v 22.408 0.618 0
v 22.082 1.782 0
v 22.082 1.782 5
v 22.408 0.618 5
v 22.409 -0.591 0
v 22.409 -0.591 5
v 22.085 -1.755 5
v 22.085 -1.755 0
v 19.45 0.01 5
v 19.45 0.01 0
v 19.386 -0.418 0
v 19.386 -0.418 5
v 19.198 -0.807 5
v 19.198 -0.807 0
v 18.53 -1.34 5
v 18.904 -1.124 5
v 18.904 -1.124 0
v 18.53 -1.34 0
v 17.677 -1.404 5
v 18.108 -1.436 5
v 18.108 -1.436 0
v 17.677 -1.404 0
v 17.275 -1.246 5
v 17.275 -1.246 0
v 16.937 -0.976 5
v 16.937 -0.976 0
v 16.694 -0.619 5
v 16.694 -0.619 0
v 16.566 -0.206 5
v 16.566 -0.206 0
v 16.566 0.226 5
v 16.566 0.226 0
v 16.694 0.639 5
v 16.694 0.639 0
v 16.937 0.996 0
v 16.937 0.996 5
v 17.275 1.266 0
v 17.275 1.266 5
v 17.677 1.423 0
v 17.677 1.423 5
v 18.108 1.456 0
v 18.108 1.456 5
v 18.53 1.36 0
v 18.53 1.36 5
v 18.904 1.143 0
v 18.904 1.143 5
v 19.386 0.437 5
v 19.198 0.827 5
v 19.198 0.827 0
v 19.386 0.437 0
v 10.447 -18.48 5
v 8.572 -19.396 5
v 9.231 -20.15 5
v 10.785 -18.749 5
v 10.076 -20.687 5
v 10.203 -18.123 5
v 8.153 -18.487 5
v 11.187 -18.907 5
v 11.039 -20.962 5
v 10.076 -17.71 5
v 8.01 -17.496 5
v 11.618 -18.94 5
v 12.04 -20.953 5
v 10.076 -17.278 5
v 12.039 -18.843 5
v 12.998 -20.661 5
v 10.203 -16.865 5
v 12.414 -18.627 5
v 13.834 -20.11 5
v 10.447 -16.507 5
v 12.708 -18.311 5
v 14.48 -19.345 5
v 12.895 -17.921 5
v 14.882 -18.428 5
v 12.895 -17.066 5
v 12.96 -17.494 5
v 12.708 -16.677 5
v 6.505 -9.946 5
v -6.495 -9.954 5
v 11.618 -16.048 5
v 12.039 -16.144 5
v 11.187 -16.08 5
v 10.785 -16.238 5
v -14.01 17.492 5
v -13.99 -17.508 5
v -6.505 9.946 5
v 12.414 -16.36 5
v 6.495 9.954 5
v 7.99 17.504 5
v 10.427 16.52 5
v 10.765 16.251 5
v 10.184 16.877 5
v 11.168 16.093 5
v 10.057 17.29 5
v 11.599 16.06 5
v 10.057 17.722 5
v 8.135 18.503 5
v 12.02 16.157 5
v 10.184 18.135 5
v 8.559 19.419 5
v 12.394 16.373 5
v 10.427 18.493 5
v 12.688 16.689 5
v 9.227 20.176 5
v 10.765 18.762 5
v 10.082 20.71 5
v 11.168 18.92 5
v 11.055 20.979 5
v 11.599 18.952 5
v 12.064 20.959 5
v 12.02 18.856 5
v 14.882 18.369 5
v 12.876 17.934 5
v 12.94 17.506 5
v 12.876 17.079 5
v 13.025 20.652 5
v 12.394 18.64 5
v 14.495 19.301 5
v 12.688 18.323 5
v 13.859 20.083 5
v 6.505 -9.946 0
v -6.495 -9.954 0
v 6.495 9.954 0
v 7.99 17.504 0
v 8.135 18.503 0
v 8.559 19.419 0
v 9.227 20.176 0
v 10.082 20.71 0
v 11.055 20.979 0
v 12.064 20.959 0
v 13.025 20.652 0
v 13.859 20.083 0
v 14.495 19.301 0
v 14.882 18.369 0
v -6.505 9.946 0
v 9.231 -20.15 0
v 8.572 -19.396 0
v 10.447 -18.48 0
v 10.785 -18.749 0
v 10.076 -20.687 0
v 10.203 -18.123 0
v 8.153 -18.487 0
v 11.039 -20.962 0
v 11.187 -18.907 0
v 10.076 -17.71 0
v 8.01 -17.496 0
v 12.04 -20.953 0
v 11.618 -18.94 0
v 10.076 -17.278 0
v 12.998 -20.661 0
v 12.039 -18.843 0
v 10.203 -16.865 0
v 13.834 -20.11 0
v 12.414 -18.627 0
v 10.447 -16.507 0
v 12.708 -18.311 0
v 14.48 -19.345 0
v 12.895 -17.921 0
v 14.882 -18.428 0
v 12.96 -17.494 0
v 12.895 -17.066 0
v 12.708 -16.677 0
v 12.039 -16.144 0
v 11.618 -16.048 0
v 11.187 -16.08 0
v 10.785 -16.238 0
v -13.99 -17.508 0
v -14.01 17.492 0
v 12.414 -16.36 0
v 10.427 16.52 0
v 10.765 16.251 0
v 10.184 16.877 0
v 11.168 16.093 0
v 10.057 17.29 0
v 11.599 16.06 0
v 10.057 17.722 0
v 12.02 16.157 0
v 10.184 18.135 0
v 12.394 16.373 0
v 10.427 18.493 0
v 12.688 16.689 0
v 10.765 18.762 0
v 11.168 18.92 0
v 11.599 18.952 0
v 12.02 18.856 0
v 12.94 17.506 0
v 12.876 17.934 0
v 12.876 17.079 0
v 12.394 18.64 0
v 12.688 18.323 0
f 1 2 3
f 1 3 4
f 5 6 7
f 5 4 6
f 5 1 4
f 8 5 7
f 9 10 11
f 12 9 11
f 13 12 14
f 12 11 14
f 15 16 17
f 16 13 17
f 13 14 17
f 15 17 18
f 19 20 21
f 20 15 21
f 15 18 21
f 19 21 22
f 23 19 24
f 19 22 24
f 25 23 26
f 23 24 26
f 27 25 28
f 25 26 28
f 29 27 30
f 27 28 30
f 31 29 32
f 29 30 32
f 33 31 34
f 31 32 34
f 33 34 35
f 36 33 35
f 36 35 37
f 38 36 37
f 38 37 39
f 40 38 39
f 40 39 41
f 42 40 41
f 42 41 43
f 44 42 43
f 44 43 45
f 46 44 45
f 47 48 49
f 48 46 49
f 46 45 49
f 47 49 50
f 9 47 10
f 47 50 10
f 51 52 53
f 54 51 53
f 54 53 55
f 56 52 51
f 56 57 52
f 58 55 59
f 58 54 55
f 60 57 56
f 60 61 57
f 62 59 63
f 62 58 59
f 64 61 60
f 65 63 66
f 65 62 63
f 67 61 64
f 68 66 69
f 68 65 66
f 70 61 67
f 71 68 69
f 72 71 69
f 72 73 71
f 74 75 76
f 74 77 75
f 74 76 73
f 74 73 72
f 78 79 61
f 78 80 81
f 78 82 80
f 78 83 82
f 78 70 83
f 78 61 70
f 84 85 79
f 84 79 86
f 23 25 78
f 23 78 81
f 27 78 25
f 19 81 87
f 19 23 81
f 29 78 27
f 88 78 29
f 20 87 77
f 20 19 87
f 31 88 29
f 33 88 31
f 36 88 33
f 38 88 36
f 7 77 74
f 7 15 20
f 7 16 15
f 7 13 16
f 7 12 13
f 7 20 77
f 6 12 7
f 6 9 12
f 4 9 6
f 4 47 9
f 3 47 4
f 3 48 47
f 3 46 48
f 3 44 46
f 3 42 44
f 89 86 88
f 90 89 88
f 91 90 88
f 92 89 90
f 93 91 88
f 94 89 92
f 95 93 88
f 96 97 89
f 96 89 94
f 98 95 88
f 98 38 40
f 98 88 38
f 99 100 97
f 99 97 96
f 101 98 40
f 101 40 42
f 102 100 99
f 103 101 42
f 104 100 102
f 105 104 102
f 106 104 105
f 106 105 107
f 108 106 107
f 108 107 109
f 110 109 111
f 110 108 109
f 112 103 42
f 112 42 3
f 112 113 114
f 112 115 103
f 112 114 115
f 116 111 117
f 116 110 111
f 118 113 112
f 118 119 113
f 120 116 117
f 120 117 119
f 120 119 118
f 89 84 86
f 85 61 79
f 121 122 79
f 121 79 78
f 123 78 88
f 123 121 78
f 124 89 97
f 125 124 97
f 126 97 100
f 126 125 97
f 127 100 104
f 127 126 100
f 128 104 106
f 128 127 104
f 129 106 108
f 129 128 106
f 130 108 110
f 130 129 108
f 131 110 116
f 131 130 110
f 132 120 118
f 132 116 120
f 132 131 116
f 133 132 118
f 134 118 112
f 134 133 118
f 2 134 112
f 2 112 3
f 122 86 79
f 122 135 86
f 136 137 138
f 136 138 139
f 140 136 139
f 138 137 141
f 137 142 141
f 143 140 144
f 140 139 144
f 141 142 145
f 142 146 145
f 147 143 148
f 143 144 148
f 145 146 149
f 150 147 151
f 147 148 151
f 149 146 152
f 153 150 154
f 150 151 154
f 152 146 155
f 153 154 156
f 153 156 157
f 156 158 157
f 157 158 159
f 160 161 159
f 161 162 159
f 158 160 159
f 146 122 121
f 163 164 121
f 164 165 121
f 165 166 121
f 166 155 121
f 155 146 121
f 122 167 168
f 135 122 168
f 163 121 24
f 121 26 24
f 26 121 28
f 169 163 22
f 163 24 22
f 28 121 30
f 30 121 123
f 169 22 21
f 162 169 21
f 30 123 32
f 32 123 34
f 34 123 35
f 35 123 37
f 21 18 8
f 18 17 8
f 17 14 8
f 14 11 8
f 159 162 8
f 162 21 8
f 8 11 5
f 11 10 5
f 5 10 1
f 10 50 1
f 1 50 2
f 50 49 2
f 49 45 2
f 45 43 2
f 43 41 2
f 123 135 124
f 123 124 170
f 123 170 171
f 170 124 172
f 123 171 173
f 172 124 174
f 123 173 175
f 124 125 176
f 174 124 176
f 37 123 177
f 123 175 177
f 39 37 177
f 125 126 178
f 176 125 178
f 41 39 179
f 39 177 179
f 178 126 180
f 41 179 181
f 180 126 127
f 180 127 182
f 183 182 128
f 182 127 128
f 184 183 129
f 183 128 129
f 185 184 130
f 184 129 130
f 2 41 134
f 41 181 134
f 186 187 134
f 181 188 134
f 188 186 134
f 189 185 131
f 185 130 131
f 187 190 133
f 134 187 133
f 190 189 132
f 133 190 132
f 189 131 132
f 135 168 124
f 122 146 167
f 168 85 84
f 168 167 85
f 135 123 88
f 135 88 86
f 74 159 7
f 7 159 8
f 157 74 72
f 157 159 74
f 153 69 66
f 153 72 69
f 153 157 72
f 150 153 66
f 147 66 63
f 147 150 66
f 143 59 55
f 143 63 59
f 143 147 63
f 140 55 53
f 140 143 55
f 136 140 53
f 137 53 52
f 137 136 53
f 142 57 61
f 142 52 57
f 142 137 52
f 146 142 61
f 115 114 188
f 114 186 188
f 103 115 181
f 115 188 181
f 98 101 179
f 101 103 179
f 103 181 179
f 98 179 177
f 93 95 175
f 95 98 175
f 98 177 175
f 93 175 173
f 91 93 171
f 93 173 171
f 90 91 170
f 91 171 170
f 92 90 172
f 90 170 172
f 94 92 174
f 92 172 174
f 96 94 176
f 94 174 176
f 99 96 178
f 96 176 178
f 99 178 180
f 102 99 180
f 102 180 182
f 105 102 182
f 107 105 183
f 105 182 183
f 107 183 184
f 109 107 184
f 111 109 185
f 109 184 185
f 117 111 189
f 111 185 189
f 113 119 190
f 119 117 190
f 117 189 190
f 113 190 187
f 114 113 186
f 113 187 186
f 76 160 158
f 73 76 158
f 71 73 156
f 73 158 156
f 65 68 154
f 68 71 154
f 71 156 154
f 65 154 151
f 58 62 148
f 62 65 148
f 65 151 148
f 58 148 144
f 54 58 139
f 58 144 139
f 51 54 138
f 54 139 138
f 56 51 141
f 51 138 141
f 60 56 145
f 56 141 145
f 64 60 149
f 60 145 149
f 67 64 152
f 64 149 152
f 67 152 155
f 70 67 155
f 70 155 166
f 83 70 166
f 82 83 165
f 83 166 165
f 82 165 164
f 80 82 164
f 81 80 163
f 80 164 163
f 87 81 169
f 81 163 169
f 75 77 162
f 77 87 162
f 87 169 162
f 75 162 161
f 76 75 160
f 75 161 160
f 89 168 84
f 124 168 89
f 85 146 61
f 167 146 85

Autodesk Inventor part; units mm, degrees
ref_plane "YZ Plane" through (0, 0, 0) normal (1, 0, 0) x (0, 1, 0)
ref_plane "XZ Plane" through (0, 0, 0) normal (0, 1, 0) x (-1, 0, 0)
ref_plane "XY Plane" through (0, 0, 0) normal (0, 0, 1) x (1, 0, 0)
sketch "Sketch1" plane through (0, 0, 0) normal (0, 0, 1) x (1, 0, 0)
  circle A0 centre (11.5096, -17.4937) radius 1.45 projected
  circle A1 centre (11.4904, 17.5063) radius 1.45 projected
  line L0 (-6.5054, 9.9465) -> (-6.4946, -9.9535) projected
  line L1 (-6.4946, -9.9535) -> (6.5054, -9.9465) projected
  line L2 (6.5054, -9.9465) -> (6.4946, 9.9535) projected
  line L3 (6.4946, 9.9535) -> (-6.5054, 9.9465) projected
  arc A2 (8.0096, -17.4956) -> (11.0077, -14.0299) centre (11.5096, -17.4937) ccw projected
  line L4 (8.0096, -17.4956) -> (-13.9904, -17.5076) projected
  line L5 (-13.9904, -17.5076) -> (-14.0096, 17.4924) projected
  line L6 (-14.0096, 17.4924) -> (7.9904, 17.5044) projected
  arc A3 (10.9923, 14.0419) -> (7.9904, 17.5044) centre (11.4904, 17.5063) ccw projected
  line L7 (10.9923, 14.0419) -> (11.0077, -14.0299) projected
  ellipse E0 centre (120.0743, 0.0597) end of major axis (125.4052, -3.3899) minor radius 6.3497 projected
  circle A4 centre (18, 0.0098) radius 1.45
  line L8 (7.9904, 17.5044) -> (8.0096, -17.4956)
  circle A5 centre (18, 0.0098) radius 4.45
  line L9 (14.8825, 18.3689) -> (22.0821, 1.7816)
  line L10 (14.8825, -18.4283) -> (22.0851, -1.7549)
  point P0 (0, 0)
  dimension "d0" = 2.9
  dimension "d1" = 3
  dimension "d2" = 7
extrude "Extrusion1" add sketch "Sketch1" along normal blind 5 contours L8 A3 L7 A2 | L4 L5 L6 L8 | A2 L7 A3 L9 A5 L10 | A5
properties part number "03_OTmic_belt_gear"
